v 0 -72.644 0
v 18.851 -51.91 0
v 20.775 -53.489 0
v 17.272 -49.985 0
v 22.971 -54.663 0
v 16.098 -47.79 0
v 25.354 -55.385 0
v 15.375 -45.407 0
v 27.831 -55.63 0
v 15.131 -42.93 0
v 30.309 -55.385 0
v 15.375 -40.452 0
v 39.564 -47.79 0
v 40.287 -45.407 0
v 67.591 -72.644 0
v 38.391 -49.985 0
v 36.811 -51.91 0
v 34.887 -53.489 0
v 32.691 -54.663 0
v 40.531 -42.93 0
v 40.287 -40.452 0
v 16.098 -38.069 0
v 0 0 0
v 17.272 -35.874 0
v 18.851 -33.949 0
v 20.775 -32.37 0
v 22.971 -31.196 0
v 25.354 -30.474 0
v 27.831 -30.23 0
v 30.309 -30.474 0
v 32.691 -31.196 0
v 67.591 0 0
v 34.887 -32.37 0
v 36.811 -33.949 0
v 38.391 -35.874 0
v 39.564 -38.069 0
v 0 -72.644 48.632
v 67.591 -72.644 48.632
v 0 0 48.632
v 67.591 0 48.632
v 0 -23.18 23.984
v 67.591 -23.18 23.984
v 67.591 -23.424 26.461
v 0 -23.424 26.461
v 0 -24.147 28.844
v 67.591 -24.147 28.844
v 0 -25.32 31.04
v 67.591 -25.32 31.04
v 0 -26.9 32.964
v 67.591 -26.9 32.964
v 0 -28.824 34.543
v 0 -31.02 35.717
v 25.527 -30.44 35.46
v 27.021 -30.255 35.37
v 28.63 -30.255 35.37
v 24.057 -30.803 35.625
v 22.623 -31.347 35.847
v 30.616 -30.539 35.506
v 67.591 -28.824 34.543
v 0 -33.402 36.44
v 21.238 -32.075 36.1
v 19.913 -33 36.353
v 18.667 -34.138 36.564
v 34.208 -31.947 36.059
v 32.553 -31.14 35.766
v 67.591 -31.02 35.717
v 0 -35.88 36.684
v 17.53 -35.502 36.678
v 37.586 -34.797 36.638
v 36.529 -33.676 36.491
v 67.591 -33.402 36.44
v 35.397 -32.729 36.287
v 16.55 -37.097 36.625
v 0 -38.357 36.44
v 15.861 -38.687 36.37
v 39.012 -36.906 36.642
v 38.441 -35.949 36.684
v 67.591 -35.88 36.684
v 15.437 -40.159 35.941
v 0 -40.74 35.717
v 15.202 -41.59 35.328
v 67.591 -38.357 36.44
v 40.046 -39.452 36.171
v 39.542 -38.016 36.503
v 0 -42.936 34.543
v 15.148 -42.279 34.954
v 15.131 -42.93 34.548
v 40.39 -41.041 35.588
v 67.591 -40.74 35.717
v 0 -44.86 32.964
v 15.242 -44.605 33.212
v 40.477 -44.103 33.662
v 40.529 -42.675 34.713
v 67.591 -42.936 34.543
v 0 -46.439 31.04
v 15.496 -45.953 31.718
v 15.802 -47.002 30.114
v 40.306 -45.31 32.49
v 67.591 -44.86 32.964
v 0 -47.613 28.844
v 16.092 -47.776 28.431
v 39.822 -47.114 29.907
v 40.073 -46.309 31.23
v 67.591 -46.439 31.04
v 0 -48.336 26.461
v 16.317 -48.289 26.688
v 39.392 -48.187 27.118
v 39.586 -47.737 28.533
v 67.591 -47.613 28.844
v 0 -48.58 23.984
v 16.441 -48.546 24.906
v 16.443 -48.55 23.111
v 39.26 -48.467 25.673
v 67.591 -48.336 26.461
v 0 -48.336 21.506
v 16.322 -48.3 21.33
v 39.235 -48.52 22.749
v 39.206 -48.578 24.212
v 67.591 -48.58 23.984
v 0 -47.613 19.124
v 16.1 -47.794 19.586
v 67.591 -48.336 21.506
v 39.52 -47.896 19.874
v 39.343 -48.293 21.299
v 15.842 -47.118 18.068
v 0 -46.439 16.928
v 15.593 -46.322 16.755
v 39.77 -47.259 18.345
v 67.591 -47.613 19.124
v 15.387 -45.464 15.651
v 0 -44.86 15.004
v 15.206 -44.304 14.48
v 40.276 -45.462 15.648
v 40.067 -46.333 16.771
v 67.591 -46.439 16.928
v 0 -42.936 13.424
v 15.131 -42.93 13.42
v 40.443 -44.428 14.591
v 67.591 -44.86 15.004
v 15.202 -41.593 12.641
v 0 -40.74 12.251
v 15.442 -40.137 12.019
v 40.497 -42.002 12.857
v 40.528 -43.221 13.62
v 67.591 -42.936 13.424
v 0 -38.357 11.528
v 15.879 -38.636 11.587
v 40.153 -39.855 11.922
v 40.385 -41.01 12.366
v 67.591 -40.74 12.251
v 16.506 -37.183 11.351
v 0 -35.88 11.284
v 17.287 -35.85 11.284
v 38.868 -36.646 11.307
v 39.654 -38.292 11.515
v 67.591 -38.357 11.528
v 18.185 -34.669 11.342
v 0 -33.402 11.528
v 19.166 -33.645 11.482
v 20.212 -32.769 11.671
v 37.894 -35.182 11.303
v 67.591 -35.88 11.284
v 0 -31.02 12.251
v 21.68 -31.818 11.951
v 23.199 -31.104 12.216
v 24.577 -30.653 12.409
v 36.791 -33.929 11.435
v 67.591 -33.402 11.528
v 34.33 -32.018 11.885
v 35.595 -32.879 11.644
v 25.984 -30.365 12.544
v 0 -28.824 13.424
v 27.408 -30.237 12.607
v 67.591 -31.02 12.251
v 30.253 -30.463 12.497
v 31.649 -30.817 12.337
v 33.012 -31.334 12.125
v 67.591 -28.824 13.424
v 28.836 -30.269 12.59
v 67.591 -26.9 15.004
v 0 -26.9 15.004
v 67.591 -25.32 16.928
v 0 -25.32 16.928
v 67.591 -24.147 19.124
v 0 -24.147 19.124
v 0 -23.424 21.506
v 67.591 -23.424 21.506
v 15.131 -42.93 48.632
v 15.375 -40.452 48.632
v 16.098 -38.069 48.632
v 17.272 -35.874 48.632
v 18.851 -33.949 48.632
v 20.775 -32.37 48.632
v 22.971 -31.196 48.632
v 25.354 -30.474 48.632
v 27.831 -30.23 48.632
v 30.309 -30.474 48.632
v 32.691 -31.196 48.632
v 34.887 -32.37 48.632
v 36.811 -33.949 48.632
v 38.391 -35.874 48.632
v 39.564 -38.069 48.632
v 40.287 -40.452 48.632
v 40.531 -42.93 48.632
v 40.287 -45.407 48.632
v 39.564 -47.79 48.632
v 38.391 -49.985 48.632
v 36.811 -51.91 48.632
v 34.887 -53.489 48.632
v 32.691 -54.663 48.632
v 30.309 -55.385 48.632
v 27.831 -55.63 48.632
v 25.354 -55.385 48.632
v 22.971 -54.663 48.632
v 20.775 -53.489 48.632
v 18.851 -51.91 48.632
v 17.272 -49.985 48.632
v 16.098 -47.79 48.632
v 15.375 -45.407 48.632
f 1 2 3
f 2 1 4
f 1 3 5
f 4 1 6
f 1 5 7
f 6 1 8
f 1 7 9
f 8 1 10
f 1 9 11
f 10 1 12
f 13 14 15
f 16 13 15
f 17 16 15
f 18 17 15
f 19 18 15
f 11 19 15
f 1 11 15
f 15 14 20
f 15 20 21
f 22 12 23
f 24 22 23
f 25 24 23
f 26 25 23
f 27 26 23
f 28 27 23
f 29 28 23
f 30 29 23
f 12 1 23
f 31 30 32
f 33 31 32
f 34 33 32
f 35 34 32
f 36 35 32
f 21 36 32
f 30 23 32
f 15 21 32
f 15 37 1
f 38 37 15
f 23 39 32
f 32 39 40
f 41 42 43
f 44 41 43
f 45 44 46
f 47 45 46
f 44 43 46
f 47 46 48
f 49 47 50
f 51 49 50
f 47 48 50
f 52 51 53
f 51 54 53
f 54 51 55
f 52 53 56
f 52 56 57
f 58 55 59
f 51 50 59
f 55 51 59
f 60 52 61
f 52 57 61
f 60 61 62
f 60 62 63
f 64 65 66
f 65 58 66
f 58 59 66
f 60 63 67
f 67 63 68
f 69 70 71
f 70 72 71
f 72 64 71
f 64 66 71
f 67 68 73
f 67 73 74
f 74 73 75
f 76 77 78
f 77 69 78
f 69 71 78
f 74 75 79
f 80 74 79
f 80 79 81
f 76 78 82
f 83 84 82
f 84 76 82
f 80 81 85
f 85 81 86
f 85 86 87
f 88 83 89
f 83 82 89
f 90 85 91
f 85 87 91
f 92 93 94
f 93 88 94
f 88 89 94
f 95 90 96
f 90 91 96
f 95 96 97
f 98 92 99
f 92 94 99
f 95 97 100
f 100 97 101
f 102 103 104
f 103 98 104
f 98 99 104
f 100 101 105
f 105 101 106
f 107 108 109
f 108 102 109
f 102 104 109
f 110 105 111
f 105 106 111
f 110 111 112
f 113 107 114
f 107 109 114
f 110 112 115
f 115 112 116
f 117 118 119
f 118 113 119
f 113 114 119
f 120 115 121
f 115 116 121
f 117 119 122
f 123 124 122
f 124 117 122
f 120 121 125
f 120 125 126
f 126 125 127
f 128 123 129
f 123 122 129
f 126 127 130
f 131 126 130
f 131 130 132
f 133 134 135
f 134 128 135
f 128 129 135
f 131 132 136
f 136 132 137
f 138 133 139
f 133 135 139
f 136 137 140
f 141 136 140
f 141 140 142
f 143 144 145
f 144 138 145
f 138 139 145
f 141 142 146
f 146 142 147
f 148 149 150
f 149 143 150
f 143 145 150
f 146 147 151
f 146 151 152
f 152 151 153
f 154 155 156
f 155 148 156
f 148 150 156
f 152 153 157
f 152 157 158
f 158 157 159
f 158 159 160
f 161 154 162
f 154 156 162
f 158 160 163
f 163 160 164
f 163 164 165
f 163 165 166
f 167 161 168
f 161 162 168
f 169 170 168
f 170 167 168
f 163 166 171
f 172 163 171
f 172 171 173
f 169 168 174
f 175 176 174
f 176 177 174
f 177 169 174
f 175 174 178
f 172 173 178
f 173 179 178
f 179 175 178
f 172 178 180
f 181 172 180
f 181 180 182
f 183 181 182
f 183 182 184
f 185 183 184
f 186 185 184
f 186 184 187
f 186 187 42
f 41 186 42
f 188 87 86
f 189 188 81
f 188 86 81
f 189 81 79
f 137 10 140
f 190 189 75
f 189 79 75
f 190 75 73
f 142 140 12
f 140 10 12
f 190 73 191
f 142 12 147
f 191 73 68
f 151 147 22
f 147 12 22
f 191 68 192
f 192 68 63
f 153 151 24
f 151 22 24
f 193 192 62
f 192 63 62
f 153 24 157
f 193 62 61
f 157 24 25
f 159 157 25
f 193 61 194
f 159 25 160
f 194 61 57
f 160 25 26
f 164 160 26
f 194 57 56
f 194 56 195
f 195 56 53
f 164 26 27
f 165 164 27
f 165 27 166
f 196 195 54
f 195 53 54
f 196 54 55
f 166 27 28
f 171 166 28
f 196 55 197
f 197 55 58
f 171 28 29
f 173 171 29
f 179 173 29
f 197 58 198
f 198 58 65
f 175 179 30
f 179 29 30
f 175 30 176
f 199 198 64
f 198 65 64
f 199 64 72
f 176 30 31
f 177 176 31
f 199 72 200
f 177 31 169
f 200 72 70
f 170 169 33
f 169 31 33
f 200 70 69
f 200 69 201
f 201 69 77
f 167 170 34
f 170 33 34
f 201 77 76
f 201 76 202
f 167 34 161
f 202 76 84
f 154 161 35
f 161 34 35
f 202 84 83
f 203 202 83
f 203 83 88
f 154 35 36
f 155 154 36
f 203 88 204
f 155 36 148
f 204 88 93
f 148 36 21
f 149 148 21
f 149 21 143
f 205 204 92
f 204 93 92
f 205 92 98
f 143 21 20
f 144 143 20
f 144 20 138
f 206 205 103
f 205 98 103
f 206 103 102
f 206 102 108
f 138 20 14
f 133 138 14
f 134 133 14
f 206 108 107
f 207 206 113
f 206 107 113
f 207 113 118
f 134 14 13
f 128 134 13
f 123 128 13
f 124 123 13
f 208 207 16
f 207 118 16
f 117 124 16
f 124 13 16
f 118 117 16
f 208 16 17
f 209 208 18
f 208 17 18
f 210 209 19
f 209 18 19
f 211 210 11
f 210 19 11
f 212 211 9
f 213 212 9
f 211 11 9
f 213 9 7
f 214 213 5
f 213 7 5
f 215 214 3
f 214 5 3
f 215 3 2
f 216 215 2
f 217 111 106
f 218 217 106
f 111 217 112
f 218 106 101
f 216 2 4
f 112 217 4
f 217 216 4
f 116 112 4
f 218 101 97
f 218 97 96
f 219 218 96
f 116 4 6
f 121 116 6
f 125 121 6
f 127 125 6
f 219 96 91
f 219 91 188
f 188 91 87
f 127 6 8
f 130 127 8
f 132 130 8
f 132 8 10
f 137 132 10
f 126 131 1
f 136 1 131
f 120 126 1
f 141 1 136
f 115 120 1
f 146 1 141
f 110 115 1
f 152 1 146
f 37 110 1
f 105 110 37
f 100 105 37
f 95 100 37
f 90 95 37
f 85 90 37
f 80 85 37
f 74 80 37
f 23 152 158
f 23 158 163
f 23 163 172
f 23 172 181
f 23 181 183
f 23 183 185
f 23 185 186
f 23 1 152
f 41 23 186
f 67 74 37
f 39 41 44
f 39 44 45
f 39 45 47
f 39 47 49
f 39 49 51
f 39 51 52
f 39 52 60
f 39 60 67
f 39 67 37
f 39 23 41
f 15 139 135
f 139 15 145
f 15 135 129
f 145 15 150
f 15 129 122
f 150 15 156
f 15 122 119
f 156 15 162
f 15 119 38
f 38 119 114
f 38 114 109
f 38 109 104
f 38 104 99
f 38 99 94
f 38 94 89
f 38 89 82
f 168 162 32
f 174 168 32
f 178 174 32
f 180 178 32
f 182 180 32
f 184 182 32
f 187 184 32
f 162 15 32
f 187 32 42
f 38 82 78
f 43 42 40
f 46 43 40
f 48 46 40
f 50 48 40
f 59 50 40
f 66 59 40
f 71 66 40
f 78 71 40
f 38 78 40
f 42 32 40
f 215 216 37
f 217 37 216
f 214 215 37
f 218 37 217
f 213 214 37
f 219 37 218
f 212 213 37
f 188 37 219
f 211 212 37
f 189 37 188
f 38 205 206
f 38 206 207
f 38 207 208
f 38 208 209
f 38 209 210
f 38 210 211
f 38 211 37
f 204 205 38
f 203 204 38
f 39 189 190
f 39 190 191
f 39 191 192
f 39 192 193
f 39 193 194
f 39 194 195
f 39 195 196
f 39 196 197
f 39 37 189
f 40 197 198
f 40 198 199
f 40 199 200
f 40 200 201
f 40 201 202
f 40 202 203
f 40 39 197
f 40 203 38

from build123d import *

# Parameters (mm, degrees)
F0_W     = 67.591384
F0_H     = 48.631672
F1_DEPTH = 72.644
F3_D     = 25.4
F5_D     = 25.4


with BuildPart() as f1:
    # F0 (on Front) → F1 (new body)
    with BuildSketch(Plane.XZ):
        with Locations((33.795692, 24.315836)):
            Rectangle(F0_W, F0_H)
    extrude(amount=F1_DEPTH)

    # F3 (through all)
    with Locations(Plane.XY.offset(48.631672)):
        with Locations((27.831206, -42.929504)):
            Hole(F3_D / 2)

    # F5 (through all)
    with Locations(Plane(origin=(0, 0, 0), x_dir=(0, -1, 0), z_dir=(-1, 0, 0))):
        with Locations((35.879802, 23.983832)):
            Hole(F5_D / 2)


solid = f1.part
